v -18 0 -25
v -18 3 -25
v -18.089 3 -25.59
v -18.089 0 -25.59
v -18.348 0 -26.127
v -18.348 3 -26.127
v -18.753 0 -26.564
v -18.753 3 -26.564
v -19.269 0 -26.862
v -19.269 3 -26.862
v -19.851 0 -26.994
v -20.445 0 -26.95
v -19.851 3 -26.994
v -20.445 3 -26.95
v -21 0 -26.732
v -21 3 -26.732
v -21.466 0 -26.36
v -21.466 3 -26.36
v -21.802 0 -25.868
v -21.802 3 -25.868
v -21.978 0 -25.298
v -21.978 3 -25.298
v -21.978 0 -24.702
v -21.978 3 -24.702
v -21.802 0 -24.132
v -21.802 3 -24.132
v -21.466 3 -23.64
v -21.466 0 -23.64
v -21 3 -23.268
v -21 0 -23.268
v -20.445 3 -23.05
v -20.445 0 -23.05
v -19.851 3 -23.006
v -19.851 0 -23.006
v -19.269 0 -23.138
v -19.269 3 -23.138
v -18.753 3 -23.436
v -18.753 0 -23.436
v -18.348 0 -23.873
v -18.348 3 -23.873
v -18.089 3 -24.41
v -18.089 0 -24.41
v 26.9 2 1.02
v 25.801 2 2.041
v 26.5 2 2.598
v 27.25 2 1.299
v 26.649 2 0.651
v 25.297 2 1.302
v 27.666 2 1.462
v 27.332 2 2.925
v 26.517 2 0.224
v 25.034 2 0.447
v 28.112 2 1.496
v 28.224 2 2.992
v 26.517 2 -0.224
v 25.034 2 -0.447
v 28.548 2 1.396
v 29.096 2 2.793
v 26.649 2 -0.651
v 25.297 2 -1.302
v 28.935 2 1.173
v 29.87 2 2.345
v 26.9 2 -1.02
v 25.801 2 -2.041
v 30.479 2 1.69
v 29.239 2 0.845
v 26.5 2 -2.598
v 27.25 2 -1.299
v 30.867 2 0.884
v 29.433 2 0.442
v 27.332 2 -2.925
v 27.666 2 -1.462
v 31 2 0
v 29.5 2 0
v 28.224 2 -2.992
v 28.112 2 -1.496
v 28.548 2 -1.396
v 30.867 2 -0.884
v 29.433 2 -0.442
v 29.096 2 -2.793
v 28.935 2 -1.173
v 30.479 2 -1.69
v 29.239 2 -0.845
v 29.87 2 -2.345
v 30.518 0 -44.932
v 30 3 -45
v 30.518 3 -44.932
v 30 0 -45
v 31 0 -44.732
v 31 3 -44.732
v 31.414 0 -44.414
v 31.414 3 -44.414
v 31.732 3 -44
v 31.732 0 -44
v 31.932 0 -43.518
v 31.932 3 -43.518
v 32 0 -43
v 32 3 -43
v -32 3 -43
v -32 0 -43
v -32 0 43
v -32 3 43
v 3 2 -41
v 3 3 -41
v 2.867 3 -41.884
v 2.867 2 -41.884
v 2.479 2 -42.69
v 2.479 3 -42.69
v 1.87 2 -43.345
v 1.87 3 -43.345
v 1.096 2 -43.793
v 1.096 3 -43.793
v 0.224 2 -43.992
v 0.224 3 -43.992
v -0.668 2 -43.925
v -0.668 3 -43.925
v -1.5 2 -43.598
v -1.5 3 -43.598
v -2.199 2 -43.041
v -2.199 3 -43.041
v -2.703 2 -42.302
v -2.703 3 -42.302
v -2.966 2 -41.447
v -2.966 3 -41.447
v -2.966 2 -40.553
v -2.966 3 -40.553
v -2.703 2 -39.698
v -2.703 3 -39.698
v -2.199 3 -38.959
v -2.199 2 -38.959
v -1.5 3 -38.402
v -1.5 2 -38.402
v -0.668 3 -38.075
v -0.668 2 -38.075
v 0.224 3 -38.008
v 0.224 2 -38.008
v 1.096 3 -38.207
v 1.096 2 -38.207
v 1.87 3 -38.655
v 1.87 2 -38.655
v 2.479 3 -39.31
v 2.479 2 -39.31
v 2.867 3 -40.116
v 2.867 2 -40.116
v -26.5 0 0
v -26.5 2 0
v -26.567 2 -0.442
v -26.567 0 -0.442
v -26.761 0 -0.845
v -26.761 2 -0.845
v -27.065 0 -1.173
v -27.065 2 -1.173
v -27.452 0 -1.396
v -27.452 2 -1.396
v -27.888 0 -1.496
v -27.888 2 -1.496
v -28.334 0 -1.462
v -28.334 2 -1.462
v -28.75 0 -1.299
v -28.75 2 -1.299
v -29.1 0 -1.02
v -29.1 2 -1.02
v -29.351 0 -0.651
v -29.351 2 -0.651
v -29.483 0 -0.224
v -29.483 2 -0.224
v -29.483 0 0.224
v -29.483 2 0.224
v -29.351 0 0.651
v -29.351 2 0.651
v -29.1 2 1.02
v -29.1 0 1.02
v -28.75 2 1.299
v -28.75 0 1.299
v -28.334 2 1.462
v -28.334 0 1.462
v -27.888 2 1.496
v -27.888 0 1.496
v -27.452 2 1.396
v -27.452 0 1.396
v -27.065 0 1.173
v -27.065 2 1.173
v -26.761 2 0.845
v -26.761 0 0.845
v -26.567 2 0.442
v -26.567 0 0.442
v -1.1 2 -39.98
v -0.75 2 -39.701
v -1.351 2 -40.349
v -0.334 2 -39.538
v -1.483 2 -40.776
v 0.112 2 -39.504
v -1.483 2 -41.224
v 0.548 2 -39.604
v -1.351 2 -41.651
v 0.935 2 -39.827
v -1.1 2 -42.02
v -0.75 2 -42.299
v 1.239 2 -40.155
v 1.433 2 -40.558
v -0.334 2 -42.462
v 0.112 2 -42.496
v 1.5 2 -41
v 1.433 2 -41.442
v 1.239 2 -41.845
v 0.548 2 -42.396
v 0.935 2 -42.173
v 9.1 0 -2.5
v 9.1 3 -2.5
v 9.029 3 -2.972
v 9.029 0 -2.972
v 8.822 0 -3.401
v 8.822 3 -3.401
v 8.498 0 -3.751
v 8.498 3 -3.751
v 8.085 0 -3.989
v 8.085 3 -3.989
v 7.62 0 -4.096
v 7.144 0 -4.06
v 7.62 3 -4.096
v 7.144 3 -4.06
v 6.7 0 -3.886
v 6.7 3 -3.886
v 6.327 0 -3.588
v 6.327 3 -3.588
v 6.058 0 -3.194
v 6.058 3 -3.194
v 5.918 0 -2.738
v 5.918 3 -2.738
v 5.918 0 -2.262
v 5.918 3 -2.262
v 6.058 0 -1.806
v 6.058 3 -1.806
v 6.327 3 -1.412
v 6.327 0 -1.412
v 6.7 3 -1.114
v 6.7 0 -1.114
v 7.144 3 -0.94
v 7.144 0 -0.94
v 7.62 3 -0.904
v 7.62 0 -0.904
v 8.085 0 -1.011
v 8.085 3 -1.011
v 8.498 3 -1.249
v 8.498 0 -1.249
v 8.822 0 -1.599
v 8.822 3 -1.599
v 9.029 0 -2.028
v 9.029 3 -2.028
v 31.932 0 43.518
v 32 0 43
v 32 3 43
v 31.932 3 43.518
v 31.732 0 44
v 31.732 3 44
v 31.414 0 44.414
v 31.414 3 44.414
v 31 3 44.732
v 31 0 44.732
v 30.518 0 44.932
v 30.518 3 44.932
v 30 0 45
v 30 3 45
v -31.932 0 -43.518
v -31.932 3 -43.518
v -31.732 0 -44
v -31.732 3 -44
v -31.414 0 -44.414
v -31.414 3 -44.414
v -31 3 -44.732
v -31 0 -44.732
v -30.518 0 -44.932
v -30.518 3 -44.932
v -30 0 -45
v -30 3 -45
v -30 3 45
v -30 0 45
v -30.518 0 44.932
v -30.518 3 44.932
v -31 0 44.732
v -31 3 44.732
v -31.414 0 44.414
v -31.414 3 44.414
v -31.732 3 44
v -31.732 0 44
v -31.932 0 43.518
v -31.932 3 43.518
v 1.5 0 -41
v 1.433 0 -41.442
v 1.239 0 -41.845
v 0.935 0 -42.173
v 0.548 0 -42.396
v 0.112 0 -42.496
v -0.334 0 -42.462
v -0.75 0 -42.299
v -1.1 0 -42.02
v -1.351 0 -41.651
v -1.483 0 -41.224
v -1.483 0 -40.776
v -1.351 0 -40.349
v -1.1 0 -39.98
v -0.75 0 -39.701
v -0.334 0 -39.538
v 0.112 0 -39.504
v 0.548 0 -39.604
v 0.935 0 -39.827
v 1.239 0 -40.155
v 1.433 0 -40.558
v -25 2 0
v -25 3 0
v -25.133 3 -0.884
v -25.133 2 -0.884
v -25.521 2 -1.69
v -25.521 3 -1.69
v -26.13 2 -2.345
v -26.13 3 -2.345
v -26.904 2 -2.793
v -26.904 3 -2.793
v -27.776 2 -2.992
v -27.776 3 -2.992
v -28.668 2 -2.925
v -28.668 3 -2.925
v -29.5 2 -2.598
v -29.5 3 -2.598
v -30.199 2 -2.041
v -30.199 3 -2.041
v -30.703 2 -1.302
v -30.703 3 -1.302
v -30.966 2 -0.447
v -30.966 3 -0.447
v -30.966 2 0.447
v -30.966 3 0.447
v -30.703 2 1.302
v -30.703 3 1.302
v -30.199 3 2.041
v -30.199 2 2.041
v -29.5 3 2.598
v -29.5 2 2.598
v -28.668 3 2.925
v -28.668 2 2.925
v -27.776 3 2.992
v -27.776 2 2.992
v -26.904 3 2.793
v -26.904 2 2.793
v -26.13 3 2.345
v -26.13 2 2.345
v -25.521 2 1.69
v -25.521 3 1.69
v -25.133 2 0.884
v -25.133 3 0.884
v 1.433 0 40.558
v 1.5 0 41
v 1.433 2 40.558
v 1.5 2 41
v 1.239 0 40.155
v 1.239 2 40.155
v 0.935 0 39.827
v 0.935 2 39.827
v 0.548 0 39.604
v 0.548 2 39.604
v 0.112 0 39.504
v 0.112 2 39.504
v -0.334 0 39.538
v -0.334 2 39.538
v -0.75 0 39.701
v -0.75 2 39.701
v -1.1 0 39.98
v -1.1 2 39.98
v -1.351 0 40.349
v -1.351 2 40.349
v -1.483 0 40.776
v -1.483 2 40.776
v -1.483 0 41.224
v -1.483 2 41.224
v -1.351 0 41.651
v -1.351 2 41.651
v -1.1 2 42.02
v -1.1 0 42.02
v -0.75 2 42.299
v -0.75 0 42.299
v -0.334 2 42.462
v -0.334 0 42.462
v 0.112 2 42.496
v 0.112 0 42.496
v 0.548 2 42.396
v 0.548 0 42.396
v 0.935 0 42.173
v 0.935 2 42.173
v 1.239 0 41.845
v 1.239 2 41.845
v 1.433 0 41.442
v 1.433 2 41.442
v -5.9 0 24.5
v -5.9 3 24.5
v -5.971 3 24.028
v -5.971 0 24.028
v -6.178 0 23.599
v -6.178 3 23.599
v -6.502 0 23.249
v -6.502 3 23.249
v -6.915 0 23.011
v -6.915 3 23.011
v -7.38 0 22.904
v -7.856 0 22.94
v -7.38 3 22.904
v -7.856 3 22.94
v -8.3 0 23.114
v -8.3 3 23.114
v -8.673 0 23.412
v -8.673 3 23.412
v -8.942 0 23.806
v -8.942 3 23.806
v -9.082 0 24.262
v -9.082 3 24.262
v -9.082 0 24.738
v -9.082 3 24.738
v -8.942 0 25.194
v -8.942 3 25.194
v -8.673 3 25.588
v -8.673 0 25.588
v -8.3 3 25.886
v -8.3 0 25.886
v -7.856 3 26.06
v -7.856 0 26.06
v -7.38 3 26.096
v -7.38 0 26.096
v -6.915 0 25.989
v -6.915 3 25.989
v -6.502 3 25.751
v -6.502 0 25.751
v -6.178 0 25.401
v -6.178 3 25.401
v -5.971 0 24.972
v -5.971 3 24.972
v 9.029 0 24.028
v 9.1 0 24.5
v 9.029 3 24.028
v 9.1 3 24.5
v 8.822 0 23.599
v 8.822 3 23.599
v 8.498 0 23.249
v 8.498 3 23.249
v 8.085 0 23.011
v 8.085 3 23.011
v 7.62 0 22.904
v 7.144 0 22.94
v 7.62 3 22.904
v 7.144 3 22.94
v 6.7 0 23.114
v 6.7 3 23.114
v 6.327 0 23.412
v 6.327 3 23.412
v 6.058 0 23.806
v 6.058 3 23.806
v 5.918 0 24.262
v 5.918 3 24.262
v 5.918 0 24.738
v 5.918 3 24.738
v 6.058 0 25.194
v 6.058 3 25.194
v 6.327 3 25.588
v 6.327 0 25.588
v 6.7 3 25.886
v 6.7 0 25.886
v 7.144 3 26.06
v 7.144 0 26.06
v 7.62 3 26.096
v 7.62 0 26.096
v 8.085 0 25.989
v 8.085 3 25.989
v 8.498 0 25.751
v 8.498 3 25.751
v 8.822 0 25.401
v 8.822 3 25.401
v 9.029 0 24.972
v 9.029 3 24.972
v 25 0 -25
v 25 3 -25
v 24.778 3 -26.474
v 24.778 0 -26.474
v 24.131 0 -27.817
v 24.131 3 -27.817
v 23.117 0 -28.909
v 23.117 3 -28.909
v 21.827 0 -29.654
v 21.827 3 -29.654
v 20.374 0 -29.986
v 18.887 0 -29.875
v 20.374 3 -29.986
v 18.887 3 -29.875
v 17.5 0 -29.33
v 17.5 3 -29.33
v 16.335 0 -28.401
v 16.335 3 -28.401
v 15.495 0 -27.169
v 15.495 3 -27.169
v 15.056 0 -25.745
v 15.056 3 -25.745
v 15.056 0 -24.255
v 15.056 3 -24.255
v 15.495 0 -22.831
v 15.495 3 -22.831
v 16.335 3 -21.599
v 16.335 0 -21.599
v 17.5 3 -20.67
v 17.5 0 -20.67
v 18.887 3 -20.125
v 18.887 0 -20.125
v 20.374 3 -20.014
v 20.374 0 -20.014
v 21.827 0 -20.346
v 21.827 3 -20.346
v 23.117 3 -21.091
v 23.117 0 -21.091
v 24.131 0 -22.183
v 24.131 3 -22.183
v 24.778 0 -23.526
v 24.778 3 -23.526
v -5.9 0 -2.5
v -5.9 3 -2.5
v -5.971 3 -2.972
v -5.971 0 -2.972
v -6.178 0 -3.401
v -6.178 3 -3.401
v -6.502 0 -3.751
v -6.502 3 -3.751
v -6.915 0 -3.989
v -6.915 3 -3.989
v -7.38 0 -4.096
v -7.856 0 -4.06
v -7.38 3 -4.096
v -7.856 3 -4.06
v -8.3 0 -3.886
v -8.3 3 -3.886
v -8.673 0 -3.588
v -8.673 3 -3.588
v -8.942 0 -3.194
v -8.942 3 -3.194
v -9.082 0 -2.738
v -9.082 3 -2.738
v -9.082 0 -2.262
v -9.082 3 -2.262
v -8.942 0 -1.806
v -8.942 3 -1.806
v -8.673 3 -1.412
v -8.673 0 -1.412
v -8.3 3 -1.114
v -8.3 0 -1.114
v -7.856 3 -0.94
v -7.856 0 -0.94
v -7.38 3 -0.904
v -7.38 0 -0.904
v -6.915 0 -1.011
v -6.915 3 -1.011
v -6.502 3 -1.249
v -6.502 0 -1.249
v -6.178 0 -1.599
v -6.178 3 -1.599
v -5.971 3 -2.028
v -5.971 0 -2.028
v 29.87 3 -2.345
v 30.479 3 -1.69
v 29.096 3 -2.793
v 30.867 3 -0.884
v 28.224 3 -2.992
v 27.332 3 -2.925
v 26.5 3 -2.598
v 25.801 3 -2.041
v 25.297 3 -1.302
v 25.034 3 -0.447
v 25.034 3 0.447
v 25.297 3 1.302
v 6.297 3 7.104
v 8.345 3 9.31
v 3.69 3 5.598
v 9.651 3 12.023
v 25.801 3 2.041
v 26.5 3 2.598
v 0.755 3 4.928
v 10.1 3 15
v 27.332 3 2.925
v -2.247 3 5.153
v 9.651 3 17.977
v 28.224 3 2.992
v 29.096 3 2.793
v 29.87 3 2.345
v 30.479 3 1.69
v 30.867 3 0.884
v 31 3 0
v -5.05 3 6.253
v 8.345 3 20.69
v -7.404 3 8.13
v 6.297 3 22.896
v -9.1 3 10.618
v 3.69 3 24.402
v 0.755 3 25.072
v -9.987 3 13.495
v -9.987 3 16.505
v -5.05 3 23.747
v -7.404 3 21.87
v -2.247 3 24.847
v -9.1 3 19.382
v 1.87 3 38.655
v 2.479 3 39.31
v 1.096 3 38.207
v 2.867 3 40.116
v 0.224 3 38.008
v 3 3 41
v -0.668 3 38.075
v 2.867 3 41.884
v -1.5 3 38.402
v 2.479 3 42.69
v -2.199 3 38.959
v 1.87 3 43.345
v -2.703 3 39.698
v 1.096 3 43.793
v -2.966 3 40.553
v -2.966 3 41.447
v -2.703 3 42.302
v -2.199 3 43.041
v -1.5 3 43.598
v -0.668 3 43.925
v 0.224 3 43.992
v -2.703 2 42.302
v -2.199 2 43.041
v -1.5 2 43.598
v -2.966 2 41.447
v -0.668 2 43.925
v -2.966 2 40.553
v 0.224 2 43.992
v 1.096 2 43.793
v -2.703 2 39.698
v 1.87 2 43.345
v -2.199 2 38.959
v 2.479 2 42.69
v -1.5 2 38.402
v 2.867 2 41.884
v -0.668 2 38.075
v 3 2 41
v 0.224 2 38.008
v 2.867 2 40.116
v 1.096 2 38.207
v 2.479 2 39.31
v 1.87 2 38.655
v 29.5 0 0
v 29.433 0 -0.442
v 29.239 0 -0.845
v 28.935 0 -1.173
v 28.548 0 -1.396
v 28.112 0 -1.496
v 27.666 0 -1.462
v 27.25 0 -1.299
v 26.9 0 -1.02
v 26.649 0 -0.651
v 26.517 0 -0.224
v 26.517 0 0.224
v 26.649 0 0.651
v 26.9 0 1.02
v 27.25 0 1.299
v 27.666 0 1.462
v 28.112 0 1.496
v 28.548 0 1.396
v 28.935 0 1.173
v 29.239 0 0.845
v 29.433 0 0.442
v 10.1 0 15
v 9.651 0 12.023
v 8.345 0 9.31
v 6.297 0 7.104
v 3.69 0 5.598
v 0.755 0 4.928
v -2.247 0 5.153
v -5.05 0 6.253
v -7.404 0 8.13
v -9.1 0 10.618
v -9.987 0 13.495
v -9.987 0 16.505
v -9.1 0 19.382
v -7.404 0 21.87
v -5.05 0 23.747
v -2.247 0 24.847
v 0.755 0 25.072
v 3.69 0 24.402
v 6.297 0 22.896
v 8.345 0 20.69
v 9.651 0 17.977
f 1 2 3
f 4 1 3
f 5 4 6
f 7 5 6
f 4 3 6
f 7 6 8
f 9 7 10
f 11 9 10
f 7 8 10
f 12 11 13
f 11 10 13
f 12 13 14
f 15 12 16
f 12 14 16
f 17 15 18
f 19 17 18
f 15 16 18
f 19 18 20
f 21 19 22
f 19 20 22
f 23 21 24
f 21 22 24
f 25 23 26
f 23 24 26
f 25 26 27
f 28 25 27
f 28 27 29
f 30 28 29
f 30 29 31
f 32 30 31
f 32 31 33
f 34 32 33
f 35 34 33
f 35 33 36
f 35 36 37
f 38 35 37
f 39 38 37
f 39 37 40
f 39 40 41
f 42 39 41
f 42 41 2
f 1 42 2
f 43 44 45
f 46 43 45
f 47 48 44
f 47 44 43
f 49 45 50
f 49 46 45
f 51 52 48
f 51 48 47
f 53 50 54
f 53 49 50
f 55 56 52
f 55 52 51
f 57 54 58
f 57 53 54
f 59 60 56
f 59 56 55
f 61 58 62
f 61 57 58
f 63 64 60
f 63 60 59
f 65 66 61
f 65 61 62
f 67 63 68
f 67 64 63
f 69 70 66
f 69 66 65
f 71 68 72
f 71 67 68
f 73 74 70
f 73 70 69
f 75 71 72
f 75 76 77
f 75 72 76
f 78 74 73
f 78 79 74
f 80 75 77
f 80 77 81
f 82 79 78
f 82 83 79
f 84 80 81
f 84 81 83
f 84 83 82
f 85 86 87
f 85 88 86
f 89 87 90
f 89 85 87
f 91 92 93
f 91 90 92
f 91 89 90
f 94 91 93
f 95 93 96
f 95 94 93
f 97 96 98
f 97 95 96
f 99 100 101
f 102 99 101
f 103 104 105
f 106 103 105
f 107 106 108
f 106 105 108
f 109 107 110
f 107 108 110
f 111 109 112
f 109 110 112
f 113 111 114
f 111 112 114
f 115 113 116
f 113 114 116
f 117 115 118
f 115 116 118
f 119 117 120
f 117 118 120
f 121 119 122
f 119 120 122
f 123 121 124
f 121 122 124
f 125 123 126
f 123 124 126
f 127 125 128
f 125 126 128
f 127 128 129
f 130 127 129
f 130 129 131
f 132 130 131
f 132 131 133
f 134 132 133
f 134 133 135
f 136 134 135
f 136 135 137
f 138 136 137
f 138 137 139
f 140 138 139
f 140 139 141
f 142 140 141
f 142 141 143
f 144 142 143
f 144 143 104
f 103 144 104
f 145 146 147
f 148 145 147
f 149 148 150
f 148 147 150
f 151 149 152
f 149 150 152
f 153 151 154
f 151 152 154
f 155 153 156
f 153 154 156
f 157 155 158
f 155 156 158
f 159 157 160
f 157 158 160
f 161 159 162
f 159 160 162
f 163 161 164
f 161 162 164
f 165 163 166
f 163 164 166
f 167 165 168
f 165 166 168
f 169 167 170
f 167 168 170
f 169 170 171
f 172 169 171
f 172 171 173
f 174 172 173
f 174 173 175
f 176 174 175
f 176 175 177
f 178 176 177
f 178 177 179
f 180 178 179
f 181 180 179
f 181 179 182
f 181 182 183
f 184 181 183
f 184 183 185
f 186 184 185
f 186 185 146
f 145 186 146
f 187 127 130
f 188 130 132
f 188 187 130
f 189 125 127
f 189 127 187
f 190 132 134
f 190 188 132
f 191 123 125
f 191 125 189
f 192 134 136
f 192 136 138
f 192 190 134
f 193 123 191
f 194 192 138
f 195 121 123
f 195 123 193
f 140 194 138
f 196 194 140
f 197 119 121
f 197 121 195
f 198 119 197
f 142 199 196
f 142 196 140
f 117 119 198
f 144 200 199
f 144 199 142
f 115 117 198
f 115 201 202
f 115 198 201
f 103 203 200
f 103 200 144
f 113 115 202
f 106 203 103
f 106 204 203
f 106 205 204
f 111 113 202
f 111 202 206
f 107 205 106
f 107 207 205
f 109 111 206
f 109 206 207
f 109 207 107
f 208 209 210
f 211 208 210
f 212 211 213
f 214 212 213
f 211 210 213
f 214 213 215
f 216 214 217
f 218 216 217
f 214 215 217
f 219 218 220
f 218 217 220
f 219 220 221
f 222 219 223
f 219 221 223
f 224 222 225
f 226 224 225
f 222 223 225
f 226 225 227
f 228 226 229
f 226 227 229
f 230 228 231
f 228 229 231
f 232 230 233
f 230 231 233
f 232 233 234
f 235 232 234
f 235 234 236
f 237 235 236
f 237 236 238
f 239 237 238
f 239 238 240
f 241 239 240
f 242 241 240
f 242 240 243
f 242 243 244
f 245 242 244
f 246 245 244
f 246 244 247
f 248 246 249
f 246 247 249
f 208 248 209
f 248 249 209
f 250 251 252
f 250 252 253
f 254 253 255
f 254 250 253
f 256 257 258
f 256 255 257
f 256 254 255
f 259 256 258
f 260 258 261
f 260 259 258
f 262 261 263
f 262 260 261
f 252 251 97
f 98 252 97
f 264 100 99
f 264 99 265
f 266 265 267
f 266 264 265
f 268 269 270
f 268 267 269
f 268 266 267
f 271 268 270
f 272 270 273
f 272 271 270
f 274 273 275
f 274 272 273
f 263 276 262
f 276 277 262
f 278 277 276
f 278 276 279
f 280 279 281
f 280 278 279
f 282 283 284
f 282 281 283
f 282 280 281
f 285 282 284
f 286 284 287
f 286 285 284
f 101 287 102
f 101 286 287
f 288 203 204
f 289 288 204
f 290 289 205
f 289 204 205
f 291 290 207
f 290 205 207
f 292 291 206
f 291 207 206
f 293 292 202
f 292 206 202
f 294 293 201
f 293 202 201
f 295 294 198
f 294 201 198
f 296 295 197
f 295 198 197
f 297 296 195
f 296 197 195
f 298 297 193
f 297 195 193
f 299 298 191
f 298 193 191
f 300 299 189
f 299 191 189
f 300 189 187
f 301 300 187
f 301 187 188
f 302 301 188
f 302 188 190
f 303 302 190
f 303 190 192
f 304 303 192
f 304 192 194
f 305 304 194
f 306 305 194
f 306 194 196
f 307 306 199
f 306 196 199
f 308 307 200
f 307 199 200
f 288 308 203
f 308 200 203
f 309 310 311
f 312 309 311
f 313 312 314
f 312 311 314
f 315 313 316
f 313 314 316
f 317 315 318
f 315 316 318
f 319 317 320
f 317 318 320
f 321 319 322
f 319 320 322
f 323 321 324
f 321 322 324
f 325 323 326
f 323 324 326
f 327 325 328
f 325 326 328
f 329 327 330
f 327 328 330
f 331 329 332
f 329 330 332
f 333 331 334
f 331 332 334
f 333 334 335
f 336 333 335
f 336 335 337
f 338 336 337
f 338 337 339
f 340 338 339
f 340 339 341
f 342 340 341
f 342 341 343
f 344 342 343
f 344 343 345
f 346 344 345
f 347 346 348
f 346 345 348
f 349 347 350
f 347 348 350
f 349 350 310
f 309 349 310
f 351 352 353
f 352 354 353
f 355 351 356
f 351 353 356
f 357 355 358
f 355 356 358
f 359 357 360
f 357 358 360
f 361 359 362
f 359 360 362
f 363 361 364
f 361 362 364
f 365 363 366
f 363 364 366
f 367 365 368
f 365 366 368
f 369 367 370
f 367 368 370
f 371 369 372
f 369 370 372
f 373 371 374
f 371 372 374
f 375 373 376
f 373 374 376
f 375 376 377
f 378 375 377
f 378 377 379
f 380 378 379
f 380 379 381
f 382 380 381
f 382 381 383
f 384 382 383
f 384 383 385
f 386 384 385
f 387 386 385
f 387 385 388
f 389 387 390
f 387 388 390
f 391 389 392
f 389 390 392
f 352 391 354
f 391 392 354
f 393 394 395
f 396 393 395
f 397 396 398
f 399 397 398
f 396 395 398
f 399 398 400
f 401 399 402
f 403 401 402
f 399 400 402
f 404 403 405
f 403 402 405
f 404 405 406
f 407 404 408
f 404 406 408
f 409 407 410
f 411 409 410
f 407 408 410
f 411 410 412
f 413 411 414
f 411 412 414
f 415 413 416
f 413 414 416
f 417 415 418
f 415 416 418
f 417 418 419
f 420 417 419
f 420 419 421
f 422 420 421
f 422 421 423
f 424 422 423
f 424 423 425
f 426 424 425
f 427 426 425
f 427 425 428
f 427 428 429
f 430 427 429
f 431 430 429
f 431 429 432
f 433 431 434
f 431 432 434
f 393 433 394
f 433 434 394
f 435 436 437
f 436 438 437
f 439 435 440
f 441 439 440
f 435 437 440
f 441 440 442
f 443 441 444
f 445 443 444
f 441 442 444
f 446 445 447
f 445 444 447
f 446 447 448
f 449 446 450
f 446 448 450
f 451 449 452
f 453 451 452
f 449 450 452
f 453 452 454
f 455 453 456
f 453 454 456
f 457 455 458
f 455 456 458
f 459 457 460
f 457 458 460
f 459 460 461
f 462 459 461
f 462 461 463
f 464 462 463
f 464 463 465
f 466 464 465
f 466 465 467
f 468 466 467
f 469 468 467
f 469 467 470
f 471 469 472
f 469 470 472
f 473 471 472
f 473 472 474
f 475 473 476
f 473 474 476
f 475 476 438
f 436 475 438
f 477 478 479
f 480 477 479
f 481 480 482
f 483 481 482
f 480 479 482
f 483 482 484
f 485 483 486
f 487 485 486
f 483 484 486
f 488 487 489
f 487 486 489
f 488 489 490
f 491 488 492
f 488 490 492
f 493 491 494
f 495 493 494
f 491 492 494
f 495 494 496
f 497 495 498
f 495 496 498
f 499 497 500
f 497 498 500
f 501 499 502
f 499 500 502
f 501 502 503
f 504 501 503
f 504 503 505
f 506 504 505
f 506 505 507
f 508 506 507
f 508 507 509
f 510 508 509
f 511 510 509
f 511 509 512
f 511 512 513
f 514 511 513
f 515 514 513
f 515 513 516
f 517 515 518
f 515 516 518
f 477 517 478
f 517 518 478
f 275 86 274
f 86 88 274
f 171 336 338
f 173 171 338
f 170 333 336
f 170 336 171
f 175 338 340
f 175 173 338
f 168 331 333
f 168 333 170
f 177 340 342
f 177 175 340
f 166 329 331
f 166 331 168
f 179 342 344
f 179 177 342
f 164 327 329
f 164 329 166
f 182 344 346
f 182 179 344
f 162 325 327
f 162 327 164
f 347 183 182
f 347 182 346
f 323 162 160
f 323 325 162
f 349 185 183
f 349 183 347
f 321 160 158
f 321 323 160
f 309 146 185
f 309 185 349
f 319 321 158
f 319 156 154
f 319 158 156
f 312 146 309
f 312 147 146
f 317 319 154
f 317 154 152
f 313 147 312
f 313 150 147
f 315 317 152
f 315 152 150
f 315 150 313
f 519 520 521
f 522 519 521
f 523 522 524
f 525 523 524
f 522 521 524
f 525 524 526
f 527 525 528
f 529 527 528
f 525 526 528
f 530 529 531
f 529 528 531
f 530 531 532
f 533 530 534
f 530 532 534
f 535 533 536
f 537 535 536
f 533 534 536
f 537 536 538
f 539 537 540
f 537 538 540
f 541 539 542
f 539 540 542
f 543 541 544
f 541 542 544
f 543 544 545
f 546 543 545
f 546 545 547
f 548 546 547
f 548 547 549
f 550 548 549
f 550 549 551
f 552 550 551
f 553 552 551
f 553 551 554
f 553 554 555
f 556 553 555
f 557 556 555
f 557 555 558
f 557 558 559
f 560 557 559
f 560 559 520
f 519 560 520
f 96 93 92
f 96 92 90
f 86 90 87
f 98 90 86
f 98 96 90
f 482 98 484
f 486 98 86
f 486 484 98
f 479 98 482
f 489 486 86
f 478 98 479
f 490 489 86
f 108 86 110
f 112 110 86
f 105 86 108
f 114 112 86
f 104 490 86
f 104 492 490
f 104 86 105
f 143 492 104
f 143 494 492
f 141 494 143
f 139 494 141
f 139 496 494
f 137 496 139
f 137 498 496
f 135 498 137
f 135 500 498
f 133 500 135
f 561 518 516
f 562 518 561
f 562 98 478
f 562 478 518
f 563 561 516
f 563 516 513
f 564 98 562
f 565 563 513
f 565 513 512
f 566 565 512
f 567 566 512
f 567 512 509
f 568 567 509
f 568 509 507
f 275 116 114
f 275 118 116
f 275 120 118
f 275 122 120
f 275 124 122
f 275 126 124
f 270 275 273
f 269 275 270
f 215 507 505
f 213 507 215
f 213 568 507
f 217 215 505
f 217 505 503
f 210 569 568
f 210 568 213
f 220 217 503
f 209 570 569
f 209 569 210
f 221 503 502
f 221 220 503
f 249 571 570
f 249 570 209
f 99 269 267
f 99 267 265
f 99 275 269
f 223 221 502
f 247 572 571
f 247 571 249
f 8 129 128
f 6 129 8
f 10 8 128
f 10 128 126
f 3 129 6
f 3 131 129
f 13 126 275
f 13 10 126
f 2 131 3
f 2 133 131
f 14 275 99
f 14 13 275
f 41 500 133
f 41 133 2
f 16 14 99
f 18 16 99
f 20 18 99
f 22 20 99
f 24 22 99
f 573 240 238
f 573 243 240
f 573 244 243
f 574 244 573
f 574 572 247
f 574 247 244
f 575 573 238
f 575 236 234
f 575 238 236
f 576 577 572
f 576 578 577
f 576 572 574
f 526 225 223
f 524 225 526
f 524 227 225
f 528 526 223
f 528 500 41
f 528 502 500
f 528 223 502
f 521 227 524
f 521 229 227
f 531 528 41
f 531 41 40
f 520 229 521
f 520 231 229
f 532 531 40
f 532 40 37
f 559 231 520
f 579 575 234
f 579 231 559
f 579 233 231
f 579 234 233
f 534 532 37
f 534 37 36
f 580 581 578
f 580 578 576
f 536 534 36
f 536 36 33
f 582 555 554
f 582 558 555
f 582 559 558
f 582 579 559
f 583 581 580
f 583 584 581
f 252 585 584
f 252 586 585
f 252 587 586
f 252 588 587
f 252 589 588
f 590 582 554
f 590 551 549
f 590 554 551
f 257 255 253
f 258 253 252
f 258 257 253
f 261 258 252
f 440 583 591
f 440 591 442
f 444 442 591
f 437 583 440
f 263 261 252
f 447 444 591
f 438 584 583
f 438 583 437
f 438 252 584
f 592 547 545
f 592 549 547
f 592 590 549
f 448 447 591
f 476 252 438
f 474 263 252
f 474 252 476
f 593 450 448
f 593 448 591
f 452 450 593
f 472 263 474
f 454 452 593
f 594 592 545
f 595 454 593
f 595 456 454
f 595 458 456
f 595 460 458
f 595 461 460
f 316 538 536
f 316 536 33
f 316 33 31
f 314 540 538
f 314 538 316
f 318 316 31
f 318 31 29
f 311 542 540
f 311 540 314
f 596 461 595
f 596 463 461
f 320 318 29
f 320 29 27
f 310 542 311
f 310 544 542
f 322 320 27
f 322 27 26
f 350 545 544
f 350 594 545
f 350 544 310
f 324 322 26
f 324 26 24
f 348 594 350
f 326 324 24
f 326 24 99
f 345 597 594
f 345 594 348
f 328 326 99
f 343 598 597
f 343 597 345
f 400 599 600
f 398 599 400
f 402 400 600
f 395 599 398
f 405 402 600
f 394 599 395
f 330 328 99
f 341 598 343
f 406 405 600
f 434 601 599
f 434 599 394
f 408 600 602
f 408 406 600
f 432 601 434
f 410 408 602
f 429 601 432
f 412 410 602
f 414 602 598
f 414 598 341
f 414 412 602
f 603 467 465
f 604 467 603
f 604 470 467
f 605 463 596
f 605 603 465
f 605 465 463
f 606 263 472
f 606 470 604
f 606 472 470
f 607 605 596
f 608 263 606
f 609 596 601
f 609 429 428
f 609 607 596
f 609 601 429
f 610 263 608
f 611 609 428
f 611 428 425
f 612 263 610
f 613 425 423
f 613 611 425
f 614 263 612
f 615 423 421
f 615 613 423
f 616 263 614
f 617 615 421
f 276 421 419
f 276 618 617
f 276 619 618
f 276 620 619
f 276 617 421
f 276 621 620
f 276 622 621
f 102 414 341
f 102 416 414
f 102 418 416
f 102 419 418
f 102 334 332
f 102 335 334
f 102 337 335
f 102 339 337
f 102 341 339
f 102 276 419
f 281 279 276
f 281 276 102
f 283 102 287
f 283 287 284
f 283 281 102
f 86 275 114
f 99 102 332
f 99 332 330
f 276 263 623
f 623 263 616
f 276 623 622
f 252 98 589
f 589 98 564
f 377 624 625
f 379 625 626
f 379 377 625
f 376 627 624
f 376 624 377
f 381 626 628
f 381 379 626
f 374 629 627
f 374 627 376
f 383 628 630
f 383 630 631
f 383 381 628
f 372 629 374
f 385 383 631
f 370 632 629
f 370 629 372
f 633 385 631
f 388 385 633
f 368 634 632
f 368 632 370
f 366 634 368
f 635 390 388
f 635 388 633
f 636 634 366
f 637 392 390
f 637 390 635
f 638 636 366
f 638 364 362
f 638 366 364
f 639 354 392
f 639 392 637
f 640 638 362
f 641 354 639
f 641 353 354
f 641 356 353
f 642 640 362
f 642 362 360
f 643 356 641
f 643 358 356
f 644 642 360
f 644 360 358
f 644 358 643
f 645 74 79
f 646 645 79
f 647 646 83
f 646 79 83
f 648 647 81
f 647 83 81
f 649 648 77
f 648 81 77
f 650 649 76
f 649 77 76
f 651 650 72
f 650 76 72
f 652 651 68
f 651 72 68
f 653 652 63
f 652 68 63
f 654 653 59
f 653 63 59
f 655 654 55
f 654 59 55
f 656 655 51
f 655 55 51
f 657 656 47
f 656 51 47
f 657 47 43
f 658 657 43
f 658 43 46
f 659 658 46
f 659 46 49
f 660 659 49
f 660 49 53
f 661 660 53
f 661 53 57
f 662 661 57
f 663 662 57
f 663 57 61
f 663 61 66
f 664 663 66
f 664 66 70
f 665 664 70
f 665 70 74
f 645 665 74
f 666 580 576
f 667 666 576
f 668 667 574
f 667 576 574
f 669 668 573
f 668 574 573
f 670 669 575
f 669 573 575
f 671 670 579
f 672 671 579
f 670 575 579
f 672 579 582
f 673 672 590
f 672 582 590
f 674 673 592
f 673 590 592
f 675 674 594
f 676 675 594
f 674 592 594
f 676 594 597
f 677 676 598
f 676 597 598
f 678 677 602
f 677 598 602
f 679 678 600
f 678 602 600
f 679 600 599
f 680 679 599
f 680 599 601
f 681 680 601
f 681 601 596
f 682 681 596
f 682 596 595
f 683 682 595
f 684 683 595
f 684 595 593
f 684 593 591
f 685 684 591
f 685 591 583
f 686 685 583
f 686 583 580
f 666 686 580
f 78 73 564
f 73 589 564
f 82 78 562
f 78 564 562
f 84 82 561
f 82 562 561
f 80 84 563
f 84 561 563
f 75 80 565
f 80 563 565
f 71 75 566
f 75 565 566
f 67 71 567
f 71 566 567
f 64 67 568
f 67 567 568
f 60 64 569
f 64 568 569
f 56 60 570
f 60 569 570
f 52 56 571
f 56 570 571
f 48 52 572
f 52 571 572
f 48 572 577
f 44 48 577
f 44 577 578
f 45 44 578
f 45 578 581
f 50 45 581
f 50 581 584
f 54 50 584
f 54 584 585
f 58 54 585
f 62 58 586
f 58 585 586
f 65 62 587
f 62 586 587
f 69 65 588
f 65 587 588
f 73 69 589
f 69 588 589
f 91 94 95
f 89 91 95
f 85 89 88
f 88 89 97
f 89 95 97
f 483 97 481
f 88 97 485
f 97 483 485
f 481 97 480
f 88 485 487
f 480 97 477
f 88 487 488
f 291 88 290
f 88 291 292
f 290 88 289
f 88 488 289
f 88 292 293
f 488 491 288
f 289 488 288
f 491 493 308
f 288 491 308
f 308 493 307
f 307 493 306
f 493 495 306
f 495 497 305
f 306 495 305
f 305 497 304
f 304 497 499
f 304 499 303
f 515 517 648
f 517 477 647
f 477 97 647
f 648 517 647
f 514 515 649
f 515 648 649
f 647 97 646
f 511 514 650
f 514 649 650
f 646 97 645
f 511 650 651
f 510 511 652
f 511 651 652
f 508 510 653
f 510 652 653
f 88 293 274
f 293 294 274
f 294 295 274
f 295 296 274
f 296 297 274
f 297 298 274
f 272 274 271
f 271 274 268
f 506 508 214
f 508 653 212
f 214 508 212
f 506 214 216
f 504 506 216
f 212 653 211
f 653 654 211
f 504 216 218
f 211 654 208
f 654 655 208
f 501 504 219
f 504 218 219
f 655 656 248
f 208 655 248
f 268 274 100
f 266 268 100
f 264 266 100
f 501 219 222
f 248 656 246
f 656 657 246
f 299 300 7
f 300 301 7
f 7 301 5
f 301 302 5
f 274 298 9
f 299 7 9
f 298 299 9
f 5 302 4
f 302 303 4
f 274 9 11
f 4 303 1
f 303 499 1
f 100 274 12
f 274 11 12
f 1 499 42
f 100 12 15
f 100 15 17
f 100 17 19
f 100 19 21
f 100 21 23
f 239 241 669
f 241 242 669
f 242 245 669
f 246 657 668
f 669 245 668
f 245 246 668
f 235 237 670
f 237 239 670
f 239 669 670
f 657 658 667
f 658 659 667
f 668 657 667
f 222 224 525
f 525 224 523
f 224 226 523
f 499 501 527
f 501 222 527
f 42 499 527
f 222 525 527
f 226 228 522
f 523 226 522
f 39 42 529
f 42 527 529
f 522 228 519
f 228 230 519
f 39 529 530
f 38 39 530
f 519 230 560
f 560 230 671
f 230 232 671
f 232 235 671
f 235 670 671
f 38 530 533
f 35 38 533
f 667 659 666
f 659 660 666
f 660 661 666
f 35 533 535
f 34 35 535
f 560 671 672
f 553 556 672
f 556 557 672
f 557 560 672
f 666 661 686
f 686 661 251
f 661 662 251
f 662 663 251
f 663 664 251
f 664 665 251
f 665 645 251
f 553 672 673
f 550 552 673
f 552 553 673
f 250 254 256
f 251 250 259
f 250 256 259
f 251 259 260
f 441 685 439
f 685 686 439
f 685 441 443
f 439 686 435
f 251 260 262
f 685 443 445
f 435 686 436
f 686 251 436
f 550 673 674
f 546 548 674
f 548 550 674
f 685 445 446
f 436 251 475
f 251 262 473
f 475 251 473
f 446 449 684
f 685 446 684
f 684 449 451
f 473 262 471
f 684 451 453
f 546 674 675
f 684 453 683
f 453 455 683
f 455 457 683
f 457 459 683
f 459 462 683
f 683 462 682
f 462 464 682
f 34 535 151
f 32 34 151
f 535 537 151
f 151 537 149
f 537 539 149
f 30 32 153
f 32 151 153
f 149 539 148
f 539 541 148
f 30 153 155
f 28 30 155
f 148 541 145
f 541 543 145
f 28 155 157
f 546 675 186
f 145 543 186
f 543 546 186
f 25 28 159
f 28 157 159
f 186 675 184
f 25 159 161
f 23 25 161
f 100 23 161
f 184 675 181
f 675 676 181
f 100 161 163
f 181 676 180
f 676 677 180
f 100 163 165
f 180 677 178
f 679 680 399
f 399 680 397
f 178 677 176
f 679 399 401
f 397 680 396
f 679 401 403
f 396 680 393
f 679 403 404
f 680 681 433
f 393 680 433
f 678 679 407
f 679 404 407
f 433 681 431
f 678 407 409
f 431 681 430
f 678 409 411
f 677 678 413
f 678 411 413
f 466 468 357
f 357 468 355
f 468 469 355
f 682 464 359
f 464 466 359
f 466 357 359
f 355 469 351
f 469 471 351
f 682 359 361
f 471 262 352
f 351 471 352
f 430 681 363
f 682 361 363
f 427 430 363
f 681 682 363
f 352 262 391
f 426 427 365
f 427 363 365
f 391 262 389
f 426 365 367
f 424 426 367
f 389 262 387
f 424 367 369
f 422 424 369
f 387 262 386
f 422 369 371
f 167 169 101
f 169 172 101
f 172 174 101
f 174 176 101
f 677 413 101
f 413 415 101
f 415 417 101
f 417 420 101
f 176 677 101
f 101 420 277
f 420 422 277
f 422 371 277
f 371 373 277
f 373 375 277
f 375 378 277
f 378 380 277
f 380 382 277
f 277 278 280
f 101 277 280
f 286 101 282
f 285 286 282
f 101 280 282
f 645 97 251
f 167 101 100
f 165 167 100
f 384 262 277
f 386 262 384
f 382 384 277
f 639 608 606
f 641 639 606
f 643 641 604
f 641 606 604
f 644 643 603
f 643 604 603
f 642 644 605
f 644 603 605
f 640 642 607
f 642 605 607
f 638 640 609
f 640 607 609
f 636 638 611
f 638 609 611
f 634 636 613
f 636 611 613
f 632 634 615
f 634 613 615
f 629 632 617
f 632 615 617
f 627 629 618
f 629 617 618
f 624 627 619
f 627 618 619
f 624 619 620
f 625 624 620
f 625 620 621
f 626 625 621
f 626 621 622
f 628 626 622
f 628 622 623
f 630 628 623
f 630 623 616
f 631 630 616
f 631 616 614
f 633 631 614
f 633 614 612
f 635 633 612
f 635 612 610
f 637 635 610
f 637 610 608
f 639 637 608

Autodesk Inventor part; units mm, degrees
ref_plane "YZ Plane" through (0, 0, 0) normal (1, 0, 0) x (0, 1, 0)
ref_plane "XZ Plane" through (0, 0, 0) normal (0, 1, 0) x (-1, 0, 0)
ref_plane "XY Plane" through (0, 0, 0) normal (0, 0, 1) x (1, 0, 0)
sketch "Sketch1" plane through (0, 0, 0) normal (0, 1, 0) x (-1, 0, 0)
  line L0 (-30, -43) -> (30, -43)
  line L1 (30, -43) -> (30, 43)
  line L2 (30, 43) -> (-30, 43)
  line L3 (-30, 43) -> (-30, -43)
  line L4 (-30, -43) -> (30, 43) construction
  line L5 (30, -43) -> (-30, 43) construction
  line L6 (0, 43) -> (0, 45)
  line L7 (30, 0) -> (32, 0)
  line L8 (-30, -45) -> (30, -45)
  line L9 (32, -43) -> (32, 43)
  line L10 (30, 45) -> (-30, 45)
  line L11 (-32, 43) -> (-32, -43)
  line L12 (-32, -45) -> (32, 45) construction
  line L13 (32, -45) -> (-32, 45) construction
  arc A0 (-32, -43) -> (-30, -45) centre (-30, -43) ccw
  arc A1 (30, -45) -> (32, -43) centre (30, -43) ccw
  arc A2 (32, 43) -> (30, 45) centre (30, 43) ccw
  arc A3 (-30, 45) -> (-32, 43) centre (-30, 43) ccw
  point P0 (0, 0)
  point P1 (0, 0)
  dimension "d4" = 60
  dimension "d5" = 86
  dimension "d6" = 2
  dimension "d7" = 2
  dimension "d8" = 2
extrude "Extrusion1" add sketch "Sketch1" along normal blind 3
sketch "Sketch2" plane through (0, 3, 0) normal (0, 1, 0) x (1, 0, 0)
  circle A0 centre (0, 41) radius 1.5
  circle A1 centre (-28, 0) radius 1.5
  circle A2 centre (0, -41) radius 1.5
  circle A3 centre (28, 0) radius 1.5
  line L0 (-32, 43) -> (-32, -43)
  arc A4 (-32, -43) -> (-30, -45) centre (-30, -43) ccw
  line L1 (-30, -45) -> (30, -45)
  arc A5 (-30, 45) -> (-32, 43) centre (-30, 43) ccw
  line L2 (30, 45) -> (-30, 45)
  arc A6 (32, 43) -> (30, 45) centre (30, 43) ccw
  line L3 (32, -43) -> (32, 43)
  arc A7 (30, -45) -> (32, -43) centre (30, -43) ccw
  circle A8 centre (-20, 25) radius 2
  circle A9 centre (7.5, 2.5) radius 1.6
  circle A10 centre (7.5, -24.5) radius 1.6
  circle A11 centre (0, -15) radius 10.1
  circle A12 centre (-7.5, 2.5) radius 1.6
  circle A13 centre (-7.5, -24.5) radius 1.6
  line L4 (0, 0) -> (0, 4.1)
  circle A14 centre (20, 25) radius 5
  point P0 (-5.5, -13.5)
  dimension "d11" = 4
  dimension "d13" = 20.2
  dimension "d14" = 3.2
  dimension "d15" = 3.2
  dimension "d16" = 3.2
  dimension "d17" = 3.2
  dimension "d20" = 10
extrude "Extrusion2" cut sketch "Sketch2" against normal through all contours A0 | A1 | A2 | A3 | A8 | A9 | A10 | A11 | A12 | A13 | A14
sketch "Sketch3" plane through (0, 3, 0) normal (0, 1, 0) x (1, 0, 0)
  circle A0 centre (-28, 0) radius 1.5 projected
  circle A1 centre (0, 41) radius 1.5 projected
  circle A2 centre (0, -41) radius 1.5 projected
  circle A3 centre (28, 0) radius 1.5 projected
  circle A4 centre (0, -41) radius 3
  circle A5 centre (-28, 0) radius 3
  circle A6 centre (0, 41) radius 3
  circle A7 centre (28, 0) radius 3
  point P0 (0, 0)
  dimension "d21" = 6
  dimension "d22" = 6
  dimension "d23" = 6
  dimension "d24" = 6
extrude "Extrusion3" cut sketch "Sketch3" against normal blind 1
properties part number "Case Top"
